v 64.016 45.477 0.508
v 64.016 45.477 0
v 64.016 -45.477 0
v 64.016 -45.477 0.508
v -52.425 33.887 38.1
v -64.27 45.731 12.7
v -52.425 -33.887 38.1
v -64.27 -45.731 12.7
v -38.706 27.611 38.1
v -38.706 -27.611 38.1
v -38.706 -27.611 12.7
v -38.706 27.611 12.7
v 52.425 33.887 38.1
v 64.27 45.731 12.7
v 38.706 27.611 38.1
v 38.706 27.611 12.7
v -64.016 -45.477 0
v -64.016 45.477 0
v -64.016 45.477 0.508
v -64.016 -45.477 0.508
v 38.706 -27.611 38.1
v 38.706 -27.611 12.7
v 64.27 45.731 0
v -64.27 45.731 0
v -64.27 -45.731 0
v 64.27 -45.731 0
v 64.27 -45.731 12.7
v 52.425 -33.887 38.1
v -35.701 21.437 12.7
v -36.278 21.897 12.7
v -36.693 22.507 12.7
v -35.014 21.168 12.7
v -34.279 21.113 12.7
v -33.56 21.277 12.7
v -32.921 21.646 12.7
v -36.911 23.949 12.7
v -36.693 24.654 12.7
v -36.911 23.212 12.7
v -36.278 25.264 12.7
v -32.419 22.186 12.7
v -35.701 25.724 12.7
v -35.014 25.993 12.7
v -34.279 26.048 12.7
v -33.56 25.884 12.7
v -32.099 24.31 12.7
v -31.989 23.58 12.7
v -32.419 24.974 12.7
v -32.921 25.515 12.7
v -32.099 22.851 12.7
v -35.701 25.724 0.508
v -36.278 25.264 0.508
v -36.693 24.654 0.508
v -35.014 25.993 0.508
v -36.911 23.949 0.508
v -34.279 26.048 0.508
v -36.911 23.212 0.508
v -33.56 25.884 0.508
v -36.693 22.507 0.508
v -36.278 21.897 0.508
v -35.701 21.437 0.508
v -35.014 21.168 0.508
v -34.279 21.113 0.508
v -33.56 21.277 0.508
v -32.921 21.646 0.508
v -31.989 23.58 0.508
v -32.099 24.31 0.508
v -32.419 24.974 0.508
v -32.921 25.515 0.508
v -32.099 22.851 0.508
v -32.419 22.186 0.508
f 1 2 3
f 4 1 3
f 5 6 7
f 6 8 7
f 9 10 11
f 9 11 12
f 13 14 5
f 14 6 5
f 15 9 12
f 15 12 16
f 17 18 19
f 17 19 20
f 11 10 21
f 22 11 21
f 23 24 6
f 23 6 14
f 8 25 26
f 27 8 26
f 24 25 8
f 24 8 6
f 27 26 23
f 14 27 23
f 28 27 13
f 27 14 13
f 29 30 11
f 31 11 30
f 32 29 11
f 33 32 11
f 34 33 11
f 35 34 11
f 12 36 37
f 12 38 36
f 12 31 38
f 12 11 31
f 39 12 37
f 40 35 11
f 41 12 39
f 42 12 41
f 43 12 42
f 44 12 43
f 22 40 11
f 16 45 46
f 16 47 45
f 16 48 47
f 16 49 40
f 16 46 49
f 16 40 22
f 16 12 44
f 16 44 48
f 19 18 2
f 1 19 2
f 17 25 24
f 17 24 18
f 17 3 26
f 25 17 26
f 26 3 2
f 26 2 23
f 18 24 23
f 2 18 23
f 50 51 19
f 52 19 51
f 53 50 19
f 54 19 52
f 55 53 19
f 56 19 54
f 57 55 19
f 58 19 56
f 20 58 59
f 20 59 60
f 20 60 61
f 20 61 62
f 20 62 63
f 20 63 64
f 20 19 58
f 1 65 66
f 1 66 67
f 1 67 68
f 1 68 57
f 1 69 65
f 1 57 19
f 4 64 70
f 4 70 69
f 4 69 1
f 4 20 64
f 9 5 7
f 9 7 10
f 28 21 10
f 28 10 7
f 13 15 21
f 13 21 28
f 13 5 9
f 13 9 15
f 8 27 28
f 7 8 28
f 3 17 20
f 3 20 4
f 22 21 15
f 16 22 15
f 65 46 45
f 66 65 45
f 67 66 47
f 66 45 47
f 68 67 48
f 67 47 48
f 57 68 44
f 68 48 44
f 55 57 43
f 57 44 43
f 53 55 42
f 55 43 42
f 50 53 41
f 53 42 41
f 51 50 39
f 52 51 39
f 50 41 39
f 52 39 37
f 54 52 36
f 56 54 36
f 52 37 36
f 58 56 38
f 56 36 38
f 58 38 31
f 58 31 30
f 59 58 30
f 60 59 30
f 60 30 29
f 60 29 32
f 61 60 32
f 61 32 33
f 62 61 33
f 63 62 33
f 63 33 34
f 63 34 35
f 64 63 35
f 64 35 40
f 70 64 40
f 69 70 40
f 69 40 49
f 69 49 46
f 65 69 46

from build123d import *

# Parameters (mm, degrees)
F0_W      = 128.5392045975
F0_H      = 91.4615094662
F1_DEPTH  = 12.7
F1_FACE_W = 128.5392045975
F1_FACE_H = 91.4615094662
F2_DEPTH  = 25.4
F2_TAPER  = 25
F3_W      = 128.0312045975
F3_H      = 90.9535094662
F4_DEPTH  = 0.508
F5_W      = 77.4115473032
F5_H      = 55.2224069834
F6_DEPTH  = 25.4
F7_R      = 2.4747052008
F8_DEPTH  = 45.573990792


with BuildPart() as f1:
    # F0 (on Top) → F1 (new body)
    with BuildSketch(Plane.XY):
        Rectangle(F0_W, F0_H)
    extrude(amount=F1_DEPTH)

    # F1_face (on face) → F2 (join)
    with BuildSketch(Plane.XY.offset(12.7)):
        Rectangle(F1_FACE_W, F1_FACE_H)
    extrude(amount=F2_DEPTH, taper=F2_TAPER)

    # F3 (on face) → F4 (cut)
    with BuildSketch(Plane(origin=(0, 0, 0), x_dir=(1, 0, 0), z_dir=(0, 0, -1))):
        Rectangle(F3_W, F3_H)
    extrude(amount=-F4_DEPTH, mode=Mode.SUBTRACT)

    # F5 (on face) → F6 (cut)
    with BuildSketch(Plane.XY.offset(38.1)):
        Rectangle(F5_W, F5_H)
    extrude(amount=-F6_DEPTH, mode=Mode.SUBTRACT)

    # F7 (on face) → F8 (cut)
    with BuildSketch(Plane.XY.offset(12.7)):
        with Locations((-34.4637036324, 23.5804095864)):
            Circle(F7_R)
    extrude(amount=-F8_DEPTH, mode=Mode.SUBTRACT)


solid = f1.part
